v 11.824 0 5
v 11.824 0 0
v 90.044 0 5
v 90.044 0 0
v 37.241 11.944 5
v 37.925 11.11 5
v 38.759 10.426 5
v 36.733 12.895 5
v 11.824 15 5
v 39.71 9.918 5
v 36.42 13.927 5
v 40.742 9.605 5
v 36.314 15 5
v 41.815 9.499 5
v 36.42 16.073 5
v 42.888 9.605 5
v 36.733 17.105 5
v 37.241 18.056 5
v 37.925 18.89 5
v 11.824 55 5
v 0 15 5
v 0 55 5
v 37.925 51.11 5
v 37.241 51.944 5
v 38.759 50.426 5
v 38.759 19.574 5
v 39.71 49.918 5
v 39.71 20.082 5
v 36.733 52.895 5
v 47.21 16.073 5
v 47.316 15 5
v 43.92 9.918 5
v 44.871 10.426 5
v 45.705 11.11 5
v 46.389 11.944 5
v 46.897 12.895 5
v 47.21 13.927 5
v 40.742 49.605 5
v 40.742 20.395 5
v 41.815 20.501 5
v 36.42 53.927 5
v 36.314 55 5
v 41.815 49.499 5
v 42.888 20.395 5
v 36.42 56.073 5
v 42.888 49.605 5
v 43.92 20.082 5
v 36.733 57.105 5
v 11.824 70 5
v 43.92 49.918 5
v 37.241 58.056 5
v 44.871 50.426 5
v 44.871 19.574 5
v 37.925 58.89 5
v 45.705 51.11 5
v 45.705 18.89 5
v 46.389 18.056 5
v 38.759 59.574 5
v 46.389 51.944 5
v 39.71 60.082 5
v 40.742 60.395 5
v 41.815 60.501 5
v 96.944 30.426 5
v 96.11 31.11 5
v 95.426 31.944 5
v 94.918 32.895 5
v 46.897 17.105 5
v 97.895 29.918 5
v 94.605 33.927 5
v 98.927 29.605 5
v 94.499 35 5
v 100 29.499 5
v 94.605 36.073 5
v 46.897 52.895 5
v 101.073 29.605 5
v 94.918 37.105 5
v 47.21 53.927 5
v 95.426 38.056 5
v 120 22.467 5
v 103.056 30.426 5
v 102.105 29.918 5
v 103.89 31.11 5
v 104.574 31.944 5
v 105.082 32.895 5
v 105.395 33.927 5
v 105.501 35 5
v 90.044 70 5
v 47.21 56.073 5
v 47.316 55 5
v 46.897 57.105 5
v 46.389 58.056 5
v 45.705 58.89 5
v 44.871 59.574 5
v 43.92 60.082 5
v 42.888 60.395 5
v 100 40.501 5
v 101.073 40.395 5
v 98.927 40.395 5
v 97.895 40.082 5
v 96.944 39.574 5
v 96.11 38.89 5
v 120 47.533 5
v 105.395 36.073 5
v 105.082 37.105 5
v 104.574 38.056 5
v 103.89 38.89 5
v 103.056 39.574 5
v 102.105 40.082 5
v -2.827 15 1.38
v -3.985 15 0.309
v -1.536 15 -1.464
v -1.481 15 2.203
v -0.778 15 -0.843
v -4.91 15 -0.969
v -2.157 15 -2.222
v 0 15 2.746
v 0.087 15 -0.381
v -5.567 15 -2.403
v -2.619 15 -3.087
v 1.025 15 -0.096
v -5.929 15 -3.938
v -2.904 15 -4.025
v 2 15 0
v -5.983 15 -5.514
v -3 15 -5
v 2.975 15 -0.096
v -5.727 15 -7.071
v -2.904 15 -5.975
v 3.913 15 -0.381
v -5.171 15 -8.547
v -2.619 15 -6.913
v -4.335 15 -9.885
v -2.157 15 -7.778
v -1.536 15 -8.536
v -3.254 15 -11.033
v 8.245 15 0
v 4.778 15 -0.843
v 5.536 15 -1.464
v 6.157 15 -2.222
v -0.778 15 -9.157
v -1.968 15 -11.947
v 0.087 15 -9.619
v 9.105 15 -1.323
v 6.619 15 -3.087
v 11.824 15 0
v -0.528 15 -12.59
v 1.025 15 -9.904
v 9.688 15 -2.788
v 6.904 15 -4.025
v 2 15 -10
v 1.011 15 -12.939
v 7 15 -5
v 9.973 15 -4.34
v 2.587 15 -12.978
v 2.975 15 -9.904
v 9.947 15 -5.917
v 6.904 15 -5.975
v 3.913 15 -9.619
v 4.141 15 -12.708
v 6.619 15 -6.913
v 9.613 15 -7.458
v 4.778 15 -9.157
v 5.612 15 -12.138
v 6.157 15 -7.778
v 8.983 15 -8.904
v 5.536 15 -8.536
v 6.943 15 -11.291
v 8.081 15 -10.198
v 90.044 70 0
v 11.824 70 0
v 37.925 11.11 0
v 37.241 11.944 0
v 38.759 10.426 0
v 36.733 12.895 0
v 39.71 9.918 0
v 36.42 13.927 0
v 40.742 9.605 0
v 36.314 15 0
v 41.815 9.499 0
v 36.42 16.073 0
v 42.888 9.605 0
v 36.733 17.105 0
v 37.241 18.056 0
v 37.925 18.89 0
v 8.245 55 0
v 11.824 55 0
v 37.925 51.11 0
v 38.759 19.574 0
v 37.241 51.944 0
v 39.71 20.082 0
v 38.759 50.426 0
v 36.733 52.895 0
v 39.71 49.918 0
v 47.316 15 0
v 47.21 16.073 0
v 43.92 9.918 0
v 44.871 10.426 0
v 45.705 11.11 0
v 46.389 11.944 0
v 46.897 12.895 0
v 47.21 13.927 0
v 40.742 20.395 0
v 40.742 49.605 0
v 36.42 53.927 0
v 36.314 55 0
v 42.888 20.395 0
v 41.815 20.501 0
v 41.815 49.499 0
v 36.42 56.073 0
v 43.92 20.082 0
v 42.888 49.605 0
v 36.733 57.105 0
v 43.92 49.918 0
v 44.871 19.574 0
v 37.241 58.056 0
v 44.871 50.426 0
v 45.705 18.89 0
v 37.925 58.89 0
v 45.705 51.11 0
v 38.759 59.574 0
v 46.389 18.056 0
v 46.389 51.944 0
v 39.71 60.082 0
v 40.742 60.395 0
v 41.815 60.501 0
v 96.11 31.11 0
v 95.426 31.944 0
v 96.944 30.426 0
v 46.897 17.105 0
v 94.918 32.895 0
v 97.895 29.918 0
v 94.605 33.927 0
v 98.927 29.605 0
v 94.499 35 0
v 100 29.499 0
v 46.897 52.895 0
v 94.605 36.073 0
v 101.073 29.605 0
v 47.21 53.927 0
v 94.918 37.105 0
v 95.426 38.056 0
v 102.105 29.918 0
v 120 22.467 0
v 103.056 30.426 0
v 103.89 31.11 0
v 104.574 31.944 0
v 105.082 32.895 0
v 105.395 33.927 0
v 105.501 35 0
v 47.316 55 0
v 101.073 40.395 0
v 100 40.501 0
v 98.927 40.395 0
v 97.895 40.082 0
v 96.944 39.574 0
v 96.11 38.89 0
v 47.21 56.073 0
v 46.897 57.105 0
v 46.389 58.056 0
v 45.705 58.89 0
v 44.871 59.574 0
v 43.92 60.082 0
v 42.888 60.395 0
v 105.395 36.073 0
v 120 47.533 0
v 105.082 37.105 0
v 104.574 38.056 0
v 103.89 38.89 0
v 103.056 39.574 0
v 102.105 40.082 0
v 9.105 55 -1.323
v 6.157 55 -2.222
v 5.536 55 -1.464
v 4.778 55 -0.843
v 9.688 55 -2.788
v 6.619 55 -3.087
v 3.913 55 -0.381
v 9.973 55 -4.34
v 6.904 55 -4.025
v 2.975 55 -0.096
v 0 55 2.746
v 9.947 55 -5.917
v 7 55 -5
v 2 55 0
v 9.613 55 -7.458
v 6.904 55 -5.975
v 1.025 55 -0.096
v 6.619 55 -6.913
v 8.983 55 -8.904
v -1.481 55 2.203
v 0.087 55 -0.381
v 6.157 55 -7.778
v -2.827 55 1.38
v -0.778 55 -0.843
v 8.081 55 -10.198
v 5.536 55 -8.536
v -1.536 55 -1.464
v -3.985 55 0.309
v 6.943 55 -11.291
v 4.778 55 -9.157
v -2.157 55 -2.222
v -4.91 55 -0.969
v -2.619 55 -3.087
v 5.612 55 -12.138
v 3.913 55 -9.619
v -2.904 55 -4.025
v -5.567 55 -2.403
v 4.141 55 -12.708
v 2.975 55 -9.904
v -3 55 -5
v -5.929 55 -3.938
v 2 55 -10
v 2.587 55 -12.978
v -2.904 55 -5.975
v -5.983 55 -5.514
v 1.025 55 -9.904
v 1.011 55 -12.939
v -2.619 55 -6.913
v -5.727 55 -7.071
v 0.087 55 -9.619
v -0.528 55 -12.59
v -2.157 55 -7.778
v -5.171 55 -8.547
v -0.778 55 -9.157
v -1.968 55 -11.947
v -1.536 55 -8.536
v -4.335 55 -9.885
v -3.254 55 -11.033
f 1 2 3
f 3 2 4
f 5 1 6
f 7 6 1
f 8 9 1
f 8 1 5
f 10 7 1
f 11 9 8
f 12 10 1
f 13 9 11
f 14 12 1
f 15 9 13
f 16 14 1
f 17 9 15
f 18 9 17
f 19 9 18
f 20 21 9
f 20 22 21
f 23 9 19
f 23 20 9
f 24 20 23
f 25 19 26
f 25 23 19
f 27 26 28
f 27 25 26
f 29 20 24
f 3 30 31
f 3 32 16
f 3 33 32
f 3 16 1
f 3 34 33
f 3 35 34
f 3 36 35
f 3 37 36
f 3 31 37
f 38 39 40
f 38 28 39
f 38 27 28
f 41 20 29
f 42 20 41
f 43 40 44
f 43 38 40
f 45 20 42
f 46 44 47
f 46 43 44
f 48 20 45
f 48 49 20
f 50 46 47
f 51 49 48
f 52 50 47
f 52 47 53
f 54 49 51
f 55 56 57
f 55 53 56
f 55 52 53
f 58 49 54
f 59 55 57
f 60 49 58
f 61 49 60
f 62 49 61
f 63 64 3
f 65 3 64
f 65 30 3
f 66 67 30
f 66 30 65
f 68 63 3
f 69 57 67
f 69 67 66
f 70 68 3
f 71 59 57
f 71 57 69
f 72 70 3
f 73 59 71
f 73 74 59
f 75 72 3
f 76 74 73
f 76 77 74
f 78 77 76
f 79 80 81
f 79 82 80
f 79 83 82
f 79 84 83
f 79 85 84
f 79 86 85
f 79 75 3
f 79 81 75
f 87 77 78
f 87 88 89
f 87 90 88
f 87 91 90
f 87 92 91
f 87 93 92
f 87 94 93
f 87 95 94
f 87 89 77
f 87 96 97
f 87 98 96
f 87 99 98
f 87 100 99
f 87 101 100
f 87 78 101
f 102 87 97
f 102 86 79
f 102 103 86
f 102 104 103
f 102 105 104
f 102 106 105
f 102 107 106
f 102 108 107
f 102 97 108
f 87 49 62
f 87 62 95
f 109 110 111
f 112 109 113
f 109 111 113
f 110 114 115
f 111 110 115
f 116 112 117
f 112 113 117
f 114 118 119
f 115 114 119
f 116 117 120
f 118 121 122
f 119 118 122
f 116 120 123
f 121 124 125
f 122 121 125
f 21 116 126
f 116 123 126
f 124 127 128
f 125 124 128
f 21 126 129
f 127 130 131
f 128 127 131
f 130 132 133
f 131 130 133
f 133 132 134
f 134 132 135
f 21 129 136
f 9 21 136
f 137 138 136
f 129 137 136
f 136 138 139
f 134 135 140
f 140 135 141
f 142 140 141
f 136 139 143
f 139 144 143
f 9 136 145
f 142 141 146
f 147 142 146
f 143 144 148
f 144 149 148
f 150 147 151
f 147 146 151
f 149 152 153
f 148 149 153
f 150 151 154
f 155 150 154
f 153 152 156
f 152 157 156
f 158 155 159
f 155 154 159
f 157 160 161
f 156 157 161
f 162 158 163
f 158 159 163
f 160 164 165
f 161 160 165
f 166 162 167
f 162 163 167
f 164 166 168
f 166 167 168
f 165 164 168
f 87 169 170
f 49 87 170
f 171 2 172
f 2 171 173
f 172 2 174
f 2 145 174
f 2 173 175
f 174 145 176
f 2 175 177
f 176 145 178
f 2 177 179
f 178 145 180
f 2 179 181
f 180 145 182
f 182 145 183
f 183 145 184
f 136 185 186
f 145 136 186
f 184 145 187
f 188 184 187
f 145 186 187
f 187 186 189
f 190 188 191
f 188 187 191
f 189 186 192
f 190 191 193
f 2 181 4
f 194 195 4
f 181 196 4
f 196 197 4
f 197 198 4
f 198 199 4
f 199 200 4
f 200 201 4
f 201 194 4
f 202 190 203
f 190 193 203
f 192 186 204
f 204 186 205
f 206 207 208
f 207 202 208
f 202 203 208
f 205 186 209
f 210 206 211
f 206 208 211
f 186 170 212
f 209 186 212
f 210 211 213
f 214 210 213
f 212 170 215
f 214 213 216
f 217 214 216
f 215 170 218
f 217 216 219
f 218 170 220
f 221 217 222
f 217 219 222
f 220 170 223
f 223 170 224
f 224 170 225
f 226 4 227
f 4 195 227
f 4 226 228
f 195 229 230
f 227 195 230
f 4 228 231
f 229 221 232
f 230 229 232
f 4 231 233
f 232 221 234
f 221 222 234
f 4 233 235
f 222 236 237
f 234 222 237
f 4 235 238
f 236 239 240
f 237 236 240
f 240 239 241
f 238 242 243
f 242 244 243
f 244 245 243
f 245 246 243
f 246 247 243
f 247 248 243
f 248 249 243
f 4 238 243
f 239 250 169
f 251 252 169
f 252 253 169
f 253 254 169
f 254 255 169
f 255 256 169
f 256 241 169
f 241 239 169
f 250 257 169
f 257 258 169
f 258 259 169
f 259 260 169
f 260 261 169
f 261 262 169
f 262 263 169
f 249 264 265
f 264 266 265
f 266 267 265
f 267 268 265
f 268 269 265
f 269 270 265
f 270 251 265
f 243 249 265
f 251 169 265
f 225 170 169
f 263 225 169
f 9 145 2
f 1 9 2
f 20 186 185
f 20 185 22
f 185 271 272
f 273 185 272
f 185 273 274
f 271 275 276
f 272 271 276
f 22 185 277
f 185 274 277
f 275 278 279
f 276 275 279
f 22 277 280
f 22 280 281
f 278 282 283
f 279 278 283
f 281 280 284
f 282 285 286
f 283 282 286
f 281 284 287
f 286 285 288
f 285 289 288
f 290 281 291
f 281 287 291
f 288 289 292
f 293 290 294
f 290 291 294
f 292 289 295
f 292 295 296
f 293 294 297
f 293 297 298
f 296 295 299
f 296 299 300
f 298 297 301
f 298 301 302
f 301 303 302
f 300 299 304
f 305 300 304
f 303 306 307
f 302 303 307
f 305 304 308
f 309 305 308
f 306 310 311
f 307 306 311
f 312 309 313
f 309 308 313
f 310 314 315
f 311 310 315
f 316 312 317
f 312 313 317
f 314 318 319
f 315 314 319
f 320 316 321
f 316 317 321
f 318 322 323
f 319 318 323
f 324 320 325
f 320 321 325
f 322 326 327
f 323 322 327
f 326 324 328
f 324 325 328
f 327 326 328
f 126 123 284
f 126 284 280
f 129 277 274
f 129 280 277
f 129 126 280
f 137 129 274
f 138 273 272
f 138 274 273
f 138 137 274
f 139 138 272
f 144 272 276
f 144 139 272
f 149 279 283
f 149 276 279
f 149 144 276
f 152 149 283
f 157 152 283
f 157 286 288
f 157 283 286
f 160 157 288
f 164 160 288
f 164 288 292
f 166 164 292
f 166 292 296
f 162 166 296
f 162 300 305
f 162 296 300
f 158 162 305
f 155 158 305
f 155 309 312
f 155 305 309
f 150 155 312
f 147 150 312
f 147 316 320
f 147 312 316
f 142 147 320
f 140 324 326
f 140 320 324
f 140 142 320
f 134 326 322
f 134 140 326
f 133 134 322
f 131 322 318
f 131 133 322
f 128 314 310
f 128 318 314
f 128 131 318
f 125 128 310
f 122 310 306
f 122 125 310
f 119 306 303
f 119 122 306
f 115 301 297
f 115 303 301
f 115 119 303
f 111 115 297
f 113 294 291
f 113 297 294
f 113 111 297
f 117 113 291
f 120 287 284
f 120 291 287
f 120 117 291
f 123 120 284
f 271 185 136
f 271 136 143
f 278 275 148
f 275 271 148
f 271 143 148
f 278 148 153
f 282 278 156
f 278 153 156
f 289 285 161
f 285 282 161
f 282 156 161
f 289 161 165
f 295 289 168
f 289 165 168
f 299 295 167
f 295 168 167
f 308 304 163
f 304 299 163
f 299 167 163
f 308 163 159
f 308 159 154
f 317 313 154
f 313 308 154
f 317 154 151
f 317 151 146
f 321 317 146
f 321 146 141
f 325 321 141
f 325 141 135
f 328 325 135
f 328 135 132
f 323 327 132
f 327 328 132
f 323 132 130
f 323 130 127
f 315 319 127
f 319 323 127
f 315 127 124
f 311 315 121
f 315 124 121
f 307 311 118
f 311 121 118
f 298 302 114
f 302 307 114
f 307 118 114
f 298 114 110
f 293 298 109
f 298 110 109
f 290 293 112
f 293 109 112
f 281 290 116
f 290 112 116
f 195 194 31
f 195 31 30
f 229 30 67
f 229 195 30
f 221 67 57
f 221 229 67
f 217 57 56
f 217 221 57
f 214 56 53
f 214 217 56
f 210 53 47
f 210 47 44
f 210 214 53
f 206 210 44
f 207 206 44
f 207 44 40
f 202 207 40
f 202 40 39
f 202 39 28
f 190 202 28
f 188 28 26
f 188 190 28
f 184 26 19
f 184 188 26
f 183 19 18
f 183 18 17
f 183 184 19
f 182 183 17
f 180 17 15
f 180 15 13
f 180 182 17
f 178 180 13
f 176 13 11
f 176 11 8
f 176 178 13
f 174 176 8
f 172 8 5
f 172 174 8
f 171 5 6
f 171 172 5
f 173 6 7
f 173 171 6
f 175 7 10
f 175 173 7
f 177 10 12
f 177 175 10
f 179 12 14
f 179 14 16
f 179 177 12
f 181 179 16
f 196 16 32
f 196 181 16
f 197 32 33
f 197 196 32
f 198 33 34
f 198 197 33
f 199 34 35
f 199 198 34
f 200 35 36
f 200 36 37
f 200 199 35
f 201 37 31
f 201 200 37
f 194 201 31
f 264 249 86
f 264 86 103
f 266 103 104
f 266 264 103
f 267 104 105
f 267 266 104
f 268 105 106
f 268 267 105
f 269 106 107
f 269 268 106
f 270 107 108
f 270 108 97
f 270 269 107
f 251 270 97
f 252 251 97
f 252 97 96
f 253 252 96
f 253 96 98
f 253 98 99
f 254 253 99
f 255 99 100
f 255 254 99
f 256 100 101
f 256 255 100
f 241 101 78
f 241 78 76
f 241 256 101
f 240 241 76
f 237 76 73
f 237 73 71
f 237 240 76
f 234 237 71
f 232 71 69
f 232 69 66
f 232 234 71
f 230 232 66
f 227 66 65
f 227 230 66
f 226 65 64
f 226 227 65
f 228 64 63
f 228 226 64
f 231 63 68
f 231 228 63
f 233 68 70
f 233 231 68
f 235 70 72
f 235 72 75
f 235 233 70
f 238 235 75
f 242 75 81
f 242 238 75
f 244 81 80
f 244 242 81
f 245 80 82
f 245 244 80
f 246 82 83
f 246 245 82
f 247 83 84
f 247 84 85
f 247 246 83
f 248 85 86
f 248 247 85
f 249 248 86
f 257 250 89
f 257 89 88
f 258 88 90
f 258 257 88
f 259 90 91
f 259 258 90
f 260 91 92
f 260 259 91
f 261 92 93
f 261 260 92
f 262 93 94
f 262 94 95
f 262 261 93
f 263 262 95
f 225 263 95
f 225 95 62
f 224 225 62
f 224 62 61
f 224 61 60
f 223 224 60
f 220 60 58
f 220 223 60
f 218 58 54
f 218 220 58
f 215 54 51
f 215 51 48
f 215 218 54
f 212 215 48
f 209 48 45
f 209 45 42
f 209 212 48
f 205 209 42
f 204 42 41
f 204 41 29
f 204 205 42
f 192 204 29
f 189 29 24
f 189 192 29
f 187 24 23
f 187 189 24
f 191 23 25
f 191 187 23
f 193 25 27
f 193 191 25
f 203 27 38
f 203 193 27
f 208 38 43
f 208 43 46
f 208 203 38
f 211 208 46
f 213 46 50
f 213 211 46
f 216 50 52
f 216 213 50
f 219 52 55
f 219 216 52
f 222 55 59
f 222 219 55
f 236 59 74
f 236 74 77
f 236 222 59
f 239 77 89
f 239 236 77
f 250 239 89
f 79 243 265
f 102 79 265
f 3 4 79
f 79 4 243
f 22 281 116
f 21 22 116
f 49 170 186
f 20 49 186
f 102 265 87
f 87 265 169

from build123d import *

# Parameters (mm, degrees)
SKETCH1_R               = 5.501178274
BOSS_EXTRUDE1_DEPTH     = 5
SKETCH2_R               = 8
SKETCH2_R_2             = 5
BOSS_EXTRUDE2_DEPTH     = 70
CUT_EXTRUDE2_DEPTH      = 140.531358483
CUT_EXTRUDE2_DEPTH_BACK = 140.531358483
SKETCH4_W               = 17.823798536
SKETCH4_H               = 15


with BuildPart() as part:
    # Sketch1 → Boss-Extrude1 (new body)
    with BuildSketch(Plane.XY):
        Polygon((0, 15), (11.823798536, 15), (11.823798536, 0), (90.043570566, 0), (120, 22.467322075), (120, 47.532677925), (90.043570566, 70), (11.823798536, 70), (11.823798536, 55), (0, 55), align=None)
        with Locations((41.814977969, 55)):
            Circle(SKETCH1_R, mode=Mode.SUBTRACT)
        with Locations((41.814977969, 15)):
            Circle(SKETCH1_R, mode=Mode.SUBTRACT)
        with Locations((100, 35)):
            Circle(SKETCH1_R, mode=Mode.SUBTRACT)
    extrude(amount=BOSS_EXTRUDE1_DEPTH)

    # Sketch2 → Boss-Extrude2 (add)
    with BuildSketch(Plane(origin=(0, 0, 0), x_dir=(1, 0, 0), z_dir=(0, 1, 0))):
        with Locations(Location((2, 5, 0), (0, 0, 270))):
            Circle(SKETCH2_R)
        with Locations(Location((2, 5, 0), (0, 0, 270))):
            Circle(SKETCH2_R_2, mode=Mode.SUBTRACT)
    extrude(amount=BOSS_EXTRUDE2_DEPTH)

    # Sketch4 → Cut-Extrude2 (cut, two sides: drawn at the far end of the back side and taken through both)
    with BuildSketch(Plane.XY.offset(-CUT_EXTRUDE2_DEPTH_BACK)):
        with Locations((2.911899268, 62.5)):
            Rectangle(SKETCH4_W, SKETCH4_H)
        with Locations((2.911899268, 7.5)):
            Rectangle(SKETCH4_W, SKETCH4_H)
    extrude(amount=CUT_EXTRUDE2_DEPTH + CUT_EXTRUDE2_DEPTH_BACK, mode=Mode.SUBTRACT)


solid = part.part
